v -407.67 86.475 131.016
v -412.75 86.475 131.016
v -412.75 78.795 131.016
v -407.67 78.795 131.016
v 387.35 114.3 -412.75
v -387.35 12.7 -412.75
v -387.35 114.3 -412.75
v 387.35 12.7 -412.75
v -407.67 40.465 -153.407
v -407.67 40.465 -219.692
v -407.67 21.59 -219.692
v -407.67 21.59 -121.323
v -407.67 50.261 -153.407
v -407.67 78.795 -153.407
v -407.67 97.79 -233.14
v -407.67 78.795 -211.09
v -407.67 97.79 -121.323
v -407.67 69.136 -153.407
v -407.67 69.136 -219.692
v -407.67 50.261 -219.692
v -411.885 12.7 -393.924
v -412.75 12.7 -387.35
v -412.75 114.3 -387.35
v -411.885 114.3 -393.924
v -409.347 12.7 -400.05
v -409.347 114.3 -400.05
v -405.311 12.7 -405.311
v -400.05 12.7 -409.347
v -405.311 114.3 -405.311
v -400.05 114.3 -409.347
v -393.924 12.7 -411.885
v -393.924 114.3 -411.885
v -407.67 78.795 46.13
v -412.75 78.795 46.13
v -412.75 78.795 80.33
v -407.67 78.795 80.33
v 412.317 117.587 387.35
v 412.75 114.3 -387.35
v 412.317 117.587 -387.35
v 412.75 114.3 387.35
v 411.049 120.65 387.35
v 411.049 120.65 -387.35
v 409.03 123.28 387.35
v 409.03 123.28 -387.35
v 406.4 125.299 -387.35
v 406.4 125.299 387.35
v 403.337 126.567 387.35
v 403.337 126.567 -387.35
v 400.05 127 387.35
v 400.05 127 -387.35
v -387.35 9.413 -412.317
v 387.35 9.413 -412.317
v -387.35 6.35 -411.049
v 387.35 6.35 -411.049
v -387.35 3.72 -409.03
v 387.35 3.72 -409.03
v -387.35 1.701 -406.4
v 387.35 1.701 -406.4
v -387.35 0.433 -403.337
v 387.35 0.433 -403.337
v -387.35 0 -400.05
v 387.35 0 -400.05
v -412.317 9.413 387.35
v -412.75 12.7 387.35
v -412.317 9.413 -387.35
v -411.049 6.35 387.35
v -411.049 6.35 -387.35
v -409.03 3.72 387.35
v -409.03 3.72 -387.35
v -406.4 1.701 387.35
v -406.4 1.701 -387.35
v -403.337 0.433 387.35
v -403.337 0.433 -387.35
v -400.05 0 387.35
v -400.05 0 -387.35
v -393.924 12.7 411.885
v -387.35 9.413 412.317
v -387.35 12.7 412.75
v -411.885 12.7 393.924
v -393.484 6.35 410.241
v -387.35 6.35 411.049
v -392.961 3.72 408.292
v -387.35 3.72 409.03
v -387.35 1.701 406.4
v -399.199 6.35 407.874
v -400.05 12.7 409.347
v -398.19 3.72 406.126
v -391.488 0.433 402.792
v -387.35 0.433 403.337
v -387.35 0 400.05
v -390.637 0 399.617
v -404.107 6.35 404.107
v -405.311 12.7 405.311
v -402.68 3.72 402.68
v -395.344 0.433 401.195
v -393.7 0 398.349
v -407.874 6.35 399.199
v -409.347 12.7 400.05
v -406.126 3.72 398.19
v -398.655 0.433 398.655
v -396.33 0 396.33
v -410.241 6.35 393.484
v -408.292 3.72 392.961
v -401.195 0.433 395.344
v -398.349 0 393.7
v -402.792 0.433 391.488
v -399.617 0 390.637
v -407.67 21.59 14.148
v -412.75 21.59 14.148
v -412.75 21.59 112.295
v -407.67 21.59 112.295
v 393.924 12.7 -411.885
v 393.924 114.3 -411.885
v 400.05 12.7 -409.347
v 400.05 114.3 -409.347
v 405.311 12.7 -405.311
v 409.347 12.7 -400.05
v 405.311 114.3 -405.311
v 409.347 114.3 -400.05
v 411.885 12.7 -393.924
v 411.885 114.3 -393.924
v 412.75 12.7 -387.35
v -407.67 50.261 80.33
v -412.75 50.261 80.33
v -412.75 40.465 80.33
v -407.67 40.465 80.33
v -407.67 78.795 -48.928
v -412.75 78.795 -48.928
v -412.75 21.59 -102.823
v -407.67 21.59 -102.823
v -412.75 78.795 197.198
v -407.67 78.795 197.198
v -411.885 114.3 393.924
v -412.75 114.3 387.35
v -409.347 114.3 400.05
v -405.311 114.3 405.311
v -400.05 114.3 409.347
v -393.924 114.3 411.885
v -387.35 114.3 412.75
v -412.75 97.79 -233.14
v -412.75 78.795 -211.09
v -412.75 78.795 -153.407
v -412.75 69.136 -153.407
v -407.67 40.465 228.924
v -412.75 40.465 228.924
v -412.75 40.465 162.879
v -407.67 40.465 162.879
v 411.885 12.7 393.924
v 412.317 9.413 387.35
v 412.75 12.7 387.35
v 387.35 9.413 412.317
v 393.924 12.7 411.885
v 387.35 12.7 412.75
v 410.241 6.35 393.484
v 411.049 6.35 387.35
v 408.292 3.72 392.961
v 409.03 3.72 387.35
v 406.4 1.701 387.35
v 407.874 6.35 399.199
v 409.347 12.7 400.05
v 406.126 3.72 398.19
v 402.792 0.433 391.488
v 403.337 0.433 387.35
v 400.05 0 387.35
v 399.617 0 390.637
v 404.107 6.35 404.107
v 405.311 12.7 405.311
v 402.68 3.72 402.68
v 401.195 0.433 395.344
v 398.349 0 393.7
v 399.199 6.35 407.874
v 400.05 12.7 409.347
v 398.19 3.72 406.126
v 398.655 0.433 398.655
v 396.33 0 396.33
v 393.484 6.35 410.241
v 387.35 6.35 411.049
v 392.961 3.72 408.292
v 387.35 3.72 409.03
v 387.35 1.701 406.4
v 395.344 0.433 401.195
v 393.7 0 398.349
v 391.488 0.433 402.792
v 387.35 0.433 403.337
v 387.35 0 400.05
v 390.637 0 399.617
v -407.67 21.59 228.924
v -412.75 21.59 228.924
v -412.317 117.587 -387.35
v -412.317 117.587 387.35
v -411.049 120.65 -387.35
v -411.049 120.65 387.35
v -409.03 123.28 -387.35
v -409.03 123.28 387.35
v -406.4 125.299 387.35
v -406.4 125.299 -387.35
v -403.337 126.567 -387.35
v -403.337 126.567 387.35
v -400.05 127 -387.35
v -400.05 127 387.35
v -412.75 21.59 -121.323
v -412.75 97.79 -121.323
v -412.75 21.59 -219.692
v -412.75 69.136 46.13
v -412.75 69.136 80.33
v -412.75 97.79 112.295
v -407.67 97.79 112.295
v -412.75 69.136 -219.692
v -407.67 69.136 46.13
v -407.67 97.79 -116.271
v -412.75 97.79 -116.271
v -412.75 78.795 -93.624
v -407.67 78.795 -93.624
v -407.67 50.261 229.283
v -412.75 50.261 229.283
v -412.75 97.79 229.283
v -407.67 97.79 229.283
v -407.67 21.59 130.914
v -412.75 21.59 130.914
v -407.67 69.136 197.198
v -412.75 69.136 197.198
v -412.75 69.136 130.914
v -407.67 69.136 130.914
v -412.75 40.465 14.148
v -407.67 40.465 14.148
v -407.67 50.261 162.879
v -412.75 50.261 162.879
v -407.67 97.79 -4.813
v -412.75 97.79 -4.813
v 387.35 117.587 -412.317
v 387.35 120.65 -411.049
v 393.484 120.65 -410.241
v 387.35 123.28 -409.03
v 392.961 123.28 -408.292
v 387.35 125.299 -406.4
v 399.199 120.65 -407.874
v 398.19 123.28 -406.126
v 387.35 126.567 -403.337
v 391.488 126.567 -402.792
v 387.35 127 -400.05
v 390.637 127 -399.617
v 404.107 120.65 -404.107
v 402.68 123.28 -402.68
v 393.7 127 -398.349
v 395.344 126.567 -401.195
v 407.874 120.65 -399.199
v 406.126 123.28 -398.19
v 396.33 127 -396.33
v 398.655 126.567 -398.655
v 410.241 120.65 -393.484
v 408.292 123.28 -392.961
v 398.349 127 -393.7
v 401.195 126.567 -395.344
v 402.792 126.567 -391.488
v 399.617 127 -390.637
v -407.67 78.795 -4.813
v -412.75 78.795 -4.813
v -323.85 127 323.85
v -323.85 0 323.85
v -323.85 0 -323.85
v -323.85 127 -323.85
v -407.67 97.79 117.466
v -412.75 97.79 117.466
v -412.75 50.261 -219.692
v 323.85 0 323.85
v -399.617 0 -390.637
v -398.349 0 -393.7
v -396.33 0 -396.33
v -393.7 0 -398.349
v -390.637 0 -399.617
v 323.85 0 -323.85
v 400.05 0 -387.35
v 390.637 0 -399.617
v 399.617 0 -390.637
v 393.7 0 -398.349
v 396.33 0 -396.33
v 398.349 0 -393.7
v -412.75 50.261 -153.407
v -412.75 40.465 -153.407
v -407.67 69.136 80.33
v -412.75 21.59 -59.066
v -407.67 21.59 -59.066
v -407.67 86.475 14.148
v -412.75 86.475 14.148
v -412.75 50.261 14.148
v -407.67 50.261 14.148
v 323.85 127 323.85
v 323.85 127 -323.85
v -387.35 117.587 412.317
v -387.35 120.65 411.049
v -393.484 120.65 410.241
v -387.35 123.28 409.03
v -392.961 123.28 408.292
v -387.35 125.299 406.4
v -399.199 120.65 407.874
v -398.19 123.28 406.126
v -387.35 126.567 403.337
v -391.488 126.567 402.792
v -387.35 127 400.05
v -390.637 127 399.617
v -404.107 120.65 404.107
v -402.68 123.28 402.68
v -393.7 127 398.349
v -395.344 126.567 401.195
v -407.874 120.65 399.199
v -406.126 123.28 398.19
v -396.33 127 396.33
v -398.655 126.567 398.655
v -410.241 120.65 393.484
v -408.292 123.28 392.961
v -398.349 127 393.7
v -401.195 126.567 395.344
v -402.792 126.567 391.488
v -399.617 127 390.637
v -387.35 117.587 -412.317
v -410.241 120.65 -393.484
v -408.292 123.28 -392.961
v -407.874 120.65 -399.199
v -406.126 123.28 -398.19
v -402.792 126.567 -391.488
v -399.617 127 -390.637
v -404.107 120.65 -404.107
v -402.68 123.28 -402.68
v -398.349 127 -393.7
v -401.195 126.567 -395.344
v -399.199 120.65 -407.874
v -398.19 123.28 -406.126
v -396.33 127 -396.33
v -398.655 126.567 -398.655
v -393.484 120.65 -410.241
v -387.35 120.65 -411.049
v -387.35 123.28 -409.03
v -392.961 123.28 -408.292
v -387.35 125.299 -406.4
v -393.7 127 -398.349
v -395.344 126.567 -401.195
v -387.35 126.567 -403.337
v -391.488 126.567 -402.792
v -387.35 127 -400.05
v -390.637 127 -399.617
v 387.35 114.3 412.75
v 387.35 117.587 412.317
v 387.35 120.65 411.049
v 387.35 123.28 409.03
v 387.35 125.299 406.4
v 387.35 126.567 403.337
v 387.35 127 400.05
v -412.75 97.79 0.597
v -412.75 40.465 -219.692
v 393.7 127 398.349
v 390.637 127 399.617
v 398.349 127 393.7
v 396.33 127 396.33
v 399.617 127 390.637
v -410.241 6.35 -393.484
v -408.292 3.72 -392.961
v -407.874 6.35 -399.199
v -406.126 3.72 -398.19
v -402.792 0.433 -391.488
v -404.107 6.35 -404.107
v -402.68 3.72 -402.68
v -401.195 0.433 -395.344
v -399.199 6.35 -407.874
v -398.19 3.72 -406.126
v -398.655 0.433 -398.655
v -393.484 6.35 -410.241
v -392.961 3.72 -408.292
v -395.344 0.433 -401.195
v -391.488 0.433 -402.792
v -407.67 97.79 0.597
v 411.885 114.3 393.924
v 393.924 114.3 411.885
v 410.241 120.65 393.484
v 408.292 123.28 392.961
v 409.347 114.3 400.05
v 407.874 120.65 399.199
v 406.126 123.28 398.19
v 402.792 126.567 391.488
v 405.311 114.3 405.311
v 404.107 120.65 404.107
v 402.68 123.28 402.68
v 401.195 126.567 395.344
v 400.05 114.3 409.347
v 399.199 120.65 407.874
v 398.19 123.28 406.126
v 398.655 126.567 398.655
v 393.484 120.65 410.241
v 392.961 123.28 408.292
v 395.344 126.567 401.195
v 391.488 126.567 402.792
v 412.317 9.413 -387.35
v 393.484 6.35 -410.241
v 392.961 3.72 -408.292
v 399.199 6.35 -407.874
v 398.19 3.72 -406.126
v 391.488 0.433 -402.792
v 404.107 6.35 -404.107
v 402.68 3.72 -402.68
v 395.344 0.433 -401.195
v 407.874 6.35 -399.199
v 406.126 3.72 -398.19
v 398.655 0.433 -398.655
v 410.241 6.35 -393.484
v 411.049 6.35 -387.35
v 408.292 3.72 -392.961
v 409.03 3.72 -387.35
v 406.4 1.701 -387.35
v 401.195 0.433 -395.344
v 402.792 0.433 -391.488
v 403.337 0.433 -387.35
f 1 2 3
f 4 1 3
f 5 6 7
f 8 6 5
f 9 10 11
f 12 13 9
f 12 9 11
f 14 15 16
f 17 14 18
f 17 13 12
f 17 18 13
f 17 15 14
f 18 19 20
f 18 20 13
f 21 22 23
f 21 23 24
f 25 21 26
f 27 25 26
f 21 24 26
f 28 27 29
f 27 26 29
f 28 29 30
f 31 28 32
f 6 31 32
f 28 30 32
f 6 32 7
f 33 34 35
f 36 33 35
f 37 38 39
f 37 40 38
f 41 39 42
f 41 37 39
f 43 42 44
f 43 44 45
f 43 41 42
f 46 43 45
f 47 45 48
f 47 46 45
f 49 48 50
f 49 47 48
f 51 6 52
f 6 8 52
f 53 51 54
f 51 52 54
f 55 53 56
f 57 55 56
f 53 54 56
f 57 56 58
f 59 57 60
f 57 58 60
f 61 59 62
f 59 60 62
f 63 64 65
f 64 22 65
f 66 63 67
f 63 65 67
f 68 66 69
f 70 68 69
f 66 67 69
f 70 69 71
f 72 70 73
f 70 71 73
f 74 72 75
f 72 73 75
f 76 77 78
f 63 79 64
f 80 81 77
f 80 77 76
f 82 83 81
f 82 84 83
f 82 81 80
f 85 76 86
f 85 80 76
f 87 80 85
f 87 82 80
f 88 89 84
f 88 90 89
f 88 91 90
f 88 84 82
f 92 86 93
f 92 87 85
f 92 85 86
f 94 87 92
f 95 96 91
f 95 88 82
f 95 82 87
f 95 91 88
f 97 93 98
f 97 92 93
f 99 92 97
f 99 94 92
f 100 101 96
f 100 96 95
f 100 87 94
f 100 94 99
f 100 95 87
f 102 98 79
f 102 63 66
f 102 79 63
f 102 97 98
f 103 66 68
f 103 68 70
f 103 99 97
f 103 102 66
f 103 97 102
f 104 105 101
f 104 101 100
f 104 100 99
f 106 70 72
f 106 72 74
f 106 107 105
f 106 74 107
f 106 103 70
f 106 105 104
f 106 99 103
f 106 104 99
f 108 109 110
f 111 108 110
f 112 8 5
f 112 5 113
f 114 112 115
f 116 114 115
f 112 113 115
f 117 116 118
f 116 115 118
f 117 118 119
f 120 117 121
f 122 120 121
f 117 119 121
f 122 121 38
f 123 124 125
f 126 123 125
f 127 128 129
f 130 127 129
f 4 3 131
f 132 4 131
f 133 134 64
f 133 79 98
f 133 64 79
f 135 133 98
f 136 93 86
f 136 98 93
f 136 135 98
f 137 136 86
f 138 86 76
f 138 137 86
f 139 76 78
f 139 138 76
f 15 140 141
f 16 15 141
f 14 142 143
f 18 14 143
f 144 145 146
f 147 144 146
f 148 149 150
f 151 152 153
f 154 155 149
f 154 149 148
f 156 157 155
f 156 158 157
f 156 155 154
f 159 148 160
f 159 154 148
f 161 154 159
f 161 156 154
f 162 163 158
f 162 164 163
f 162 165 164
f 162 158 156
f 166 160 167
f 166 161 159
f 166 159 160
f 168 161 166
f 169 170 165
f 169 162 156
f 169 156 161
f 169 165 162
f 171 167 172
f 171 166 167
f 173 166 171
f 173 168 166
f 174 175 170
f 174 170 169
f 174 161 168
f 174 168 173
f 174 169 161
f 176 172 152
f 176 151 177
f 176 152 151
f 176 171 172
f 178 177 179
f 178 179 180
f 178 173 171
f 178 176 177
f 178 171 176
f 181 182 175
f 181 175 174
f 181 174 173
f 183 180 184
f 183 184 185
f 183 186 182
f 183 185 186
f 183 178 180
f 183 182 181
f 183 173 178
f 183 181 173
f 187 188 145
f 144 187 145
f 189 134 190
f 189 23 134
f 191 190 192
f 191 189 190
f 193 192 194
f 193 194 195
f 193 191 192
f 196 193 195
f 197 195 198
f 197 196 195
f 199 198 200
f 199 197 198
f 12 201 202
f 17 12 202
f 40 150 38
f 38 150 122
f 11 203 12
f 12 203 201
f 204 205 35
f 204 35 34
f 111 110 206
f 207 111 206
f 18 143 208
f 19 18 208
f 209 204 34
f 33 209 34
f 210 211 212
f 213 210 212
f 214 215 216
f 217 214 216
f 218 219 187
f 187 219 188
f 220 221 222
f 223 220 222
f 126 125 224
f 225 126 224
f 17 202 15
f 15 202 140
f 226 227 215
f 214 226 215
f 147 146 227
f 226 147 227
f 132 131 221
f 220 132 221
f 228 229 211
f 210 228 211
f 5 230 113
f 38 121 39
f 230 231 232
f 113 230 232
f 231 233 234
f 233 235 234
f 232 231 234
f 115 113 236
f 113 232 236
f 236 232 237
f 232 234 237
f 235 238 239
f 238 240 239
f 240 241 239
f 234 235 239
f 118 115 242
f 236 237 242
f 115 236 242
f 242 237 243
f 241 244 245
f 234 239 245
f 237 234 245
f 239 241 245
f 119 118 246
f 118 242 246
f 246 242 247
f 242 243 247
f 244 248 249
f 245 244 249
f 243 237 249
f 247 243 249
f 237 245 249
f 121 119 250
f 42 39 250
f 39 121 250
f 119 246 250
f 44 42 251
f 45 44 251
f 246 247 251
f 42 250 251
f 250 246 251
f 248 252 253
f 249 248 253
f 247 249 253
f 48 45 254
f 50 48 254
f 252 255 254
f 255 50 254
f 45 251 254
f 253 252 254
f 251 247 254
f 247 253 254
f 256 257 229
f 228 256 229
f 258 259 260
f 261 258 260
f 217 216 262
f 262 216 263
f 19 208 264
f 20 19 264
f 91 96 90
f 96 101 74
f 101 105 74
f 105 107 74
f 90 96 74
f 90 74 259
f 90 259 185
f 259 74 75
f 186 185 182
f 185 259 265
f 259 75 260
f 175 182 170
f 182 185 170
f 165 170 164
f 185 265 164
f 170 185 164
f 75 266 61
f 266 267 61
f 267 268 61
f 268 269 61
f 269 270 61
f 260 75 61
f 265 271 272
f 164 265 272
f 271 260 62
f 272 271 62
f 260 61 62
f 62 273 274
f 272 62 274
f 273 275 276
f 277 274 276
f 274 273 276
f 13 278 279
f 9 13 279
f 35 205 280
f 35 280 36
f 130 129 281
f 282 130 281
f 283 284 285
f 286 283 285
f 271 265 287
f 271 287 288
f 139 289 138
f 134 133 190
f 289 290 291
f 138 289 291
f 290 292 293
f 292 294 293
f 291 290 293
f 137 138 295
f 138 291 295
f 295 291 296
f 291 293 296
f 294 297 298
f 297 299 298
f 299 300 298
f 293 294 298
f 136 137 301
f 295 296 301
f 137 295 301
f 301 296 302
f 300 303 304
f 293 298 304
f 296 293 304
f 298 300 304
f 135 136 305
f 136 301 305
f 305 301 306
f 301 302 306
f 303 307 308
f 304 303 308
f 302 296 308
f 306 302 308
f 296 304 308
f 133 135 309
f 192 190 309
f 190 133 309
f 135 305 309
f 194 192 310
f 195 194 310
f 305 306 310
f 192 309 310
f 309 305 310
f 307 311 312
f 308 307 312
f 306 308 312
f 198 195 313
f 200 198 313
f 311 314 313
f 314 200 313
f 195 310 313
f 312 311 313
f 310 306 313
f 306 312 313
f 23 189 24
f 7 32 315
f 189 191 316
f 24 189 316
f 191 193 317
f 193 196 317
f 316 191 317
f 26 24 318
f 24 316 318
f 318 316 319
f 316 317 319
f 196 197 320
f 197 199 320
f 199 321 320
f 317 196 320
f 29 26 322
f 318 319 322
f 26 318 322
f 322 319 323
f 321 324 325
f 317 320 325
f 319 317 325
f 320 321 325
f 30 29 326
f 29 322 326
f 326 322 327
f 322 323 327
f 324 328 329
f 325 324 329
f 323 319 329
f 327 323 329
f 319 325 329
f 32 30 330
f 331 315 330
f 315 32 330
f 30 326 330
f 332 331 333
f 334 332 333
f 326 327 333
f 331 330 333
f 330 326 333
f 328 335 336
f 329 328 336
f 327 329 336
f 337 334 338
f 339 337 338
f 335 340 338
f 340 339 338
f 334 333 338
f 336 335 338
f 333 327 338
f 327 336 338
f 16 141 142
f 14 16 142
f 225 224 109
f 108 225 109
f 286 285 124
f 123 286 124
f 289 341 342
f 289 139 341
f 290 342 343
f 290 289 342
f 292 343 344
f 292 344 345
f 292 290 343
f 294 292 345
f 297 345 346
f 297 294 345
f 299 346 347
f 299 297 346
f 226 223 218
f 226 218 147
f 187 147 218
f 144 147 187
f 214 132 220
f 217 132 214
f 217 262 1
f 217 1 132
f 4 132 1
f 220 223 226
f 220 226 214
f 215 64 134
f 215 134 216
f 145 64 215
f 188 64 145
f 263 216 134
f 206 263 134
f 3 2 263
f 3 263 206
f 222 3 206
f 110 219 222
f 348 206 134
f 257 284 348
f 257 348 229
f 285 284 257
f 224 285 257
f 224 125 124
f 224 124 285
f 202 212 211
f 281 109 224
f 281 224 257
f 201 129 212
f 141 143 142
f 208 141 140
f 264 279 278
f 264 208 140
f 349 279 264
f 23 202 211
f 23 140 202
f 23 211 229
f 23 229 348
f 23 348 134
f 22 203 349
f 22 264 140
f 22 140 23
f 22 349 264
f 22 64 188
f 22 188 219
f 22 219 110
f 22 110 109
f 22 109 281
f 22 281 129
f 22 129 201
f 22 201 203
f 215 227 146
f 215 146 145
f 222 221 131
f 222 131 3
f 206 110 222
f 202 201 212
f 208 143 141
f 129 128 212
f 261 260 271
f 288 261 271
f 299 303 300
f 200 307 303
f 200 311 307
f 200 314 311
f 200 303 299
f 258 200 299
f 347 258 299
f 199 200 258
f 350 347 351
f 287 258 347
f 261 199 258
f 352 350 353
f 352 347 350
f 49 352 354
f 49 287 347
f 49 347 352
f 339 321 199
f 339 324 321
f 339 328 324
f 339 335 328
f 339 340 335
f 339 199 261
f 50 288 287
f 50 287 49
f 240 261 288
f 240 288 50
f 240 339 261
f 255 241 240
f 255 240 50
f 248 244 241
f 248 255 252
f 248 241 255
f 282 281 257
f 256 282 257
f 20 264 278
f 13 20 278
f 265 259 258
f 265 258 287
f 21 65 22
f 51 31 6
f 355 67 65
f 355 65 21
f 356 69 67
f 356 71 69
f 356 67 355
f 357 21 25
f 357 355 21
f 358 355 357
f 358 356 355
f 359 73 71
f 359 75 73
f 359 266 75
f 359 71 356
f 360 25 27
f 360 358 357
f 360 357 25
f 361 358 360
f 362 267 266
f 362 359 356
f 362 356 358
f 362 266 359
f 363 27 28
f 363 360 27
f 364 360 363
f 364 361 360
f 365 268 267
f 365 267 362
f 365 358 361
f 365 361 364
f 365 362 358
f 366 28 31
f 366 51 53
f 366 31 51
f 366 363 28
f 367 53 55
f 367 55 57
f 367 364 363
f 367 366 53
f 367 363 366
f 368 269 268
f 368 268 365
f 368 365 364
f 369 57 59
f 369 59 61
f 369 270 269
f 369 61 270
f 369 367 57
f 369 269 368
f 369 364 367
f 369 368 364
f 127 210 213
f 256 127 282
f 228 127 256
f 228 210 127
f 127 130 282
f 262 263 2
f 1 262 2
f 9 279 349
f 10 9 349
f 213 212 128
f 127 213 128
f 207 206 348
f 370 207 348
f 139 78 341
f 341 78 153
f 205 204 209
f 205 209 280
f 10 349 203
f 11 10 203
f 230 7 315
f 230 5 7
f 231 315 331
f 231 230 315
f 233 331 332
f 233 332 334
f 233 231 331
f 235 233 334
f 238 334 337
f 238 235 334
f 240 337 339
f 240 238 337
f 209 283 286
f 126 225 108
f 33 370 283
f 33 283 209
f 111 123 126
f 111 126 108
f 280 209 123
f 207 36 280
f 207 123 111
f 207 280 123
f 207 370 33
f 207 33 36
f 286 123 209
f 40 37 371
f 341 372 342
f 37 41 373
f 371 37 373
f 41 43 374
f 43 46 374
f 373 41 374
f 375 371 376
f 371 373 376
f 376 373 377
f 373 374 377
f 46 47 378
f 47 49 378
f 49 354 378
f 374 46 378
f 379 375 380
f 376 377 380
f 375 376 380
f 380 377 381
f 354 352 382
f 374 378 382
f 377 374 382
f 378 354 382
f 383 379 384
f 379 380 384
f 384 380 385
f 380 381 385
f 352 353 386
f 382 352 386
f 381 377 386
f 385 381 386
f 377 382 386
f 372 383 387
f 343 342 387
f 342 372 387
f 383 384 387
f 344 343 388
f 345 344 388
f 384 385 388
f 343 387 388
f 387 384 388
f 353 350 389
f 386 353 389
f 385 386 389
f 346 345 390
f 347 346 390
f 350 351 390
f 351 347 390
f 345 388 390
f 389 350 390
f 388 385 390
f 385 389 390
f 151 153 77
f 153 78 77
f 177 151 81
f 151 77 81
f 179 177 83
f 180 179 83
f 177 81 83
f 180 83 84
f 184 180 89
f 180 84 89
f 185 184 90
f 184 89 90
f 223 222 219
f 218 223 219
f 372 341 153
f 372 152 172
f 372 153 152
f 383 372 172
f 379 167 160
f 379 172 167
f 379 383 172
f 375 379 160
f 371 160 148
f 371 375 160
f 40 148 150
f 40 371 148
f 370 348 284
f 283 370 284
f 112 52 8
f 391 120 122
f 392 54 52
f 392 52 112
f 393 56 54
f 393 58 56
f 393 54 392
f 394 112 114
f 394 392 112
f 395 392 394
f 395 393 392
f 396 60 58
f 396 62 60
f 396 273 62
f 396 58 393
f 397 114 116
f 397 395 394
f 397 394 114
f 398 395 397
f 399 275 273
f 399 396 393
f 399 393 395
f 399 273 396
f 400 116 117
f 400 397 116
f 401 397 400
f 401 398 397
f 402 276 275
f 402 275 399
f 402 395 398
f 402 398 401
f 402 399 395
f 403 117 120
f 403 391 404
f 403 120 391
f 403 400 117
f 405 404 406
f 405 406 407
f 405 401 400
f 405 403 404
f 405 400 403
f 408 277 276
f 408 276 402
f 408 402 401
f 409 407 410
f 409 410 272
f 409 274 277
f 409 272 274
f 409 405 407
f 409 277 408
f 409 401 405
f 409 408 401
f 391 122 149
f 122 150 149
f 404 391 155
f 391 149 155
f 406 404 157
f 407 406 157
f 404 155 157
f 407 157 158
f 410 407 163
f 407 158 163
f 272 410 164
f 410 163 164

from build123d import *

# Parameters (mm, degrees)
SKETCH1_W           = 825.5
SKETCH1_H           = 825.5
SKETCH1_W_2         = 647.7
SKETCH1_H_2         = 647.7
BOSS_EXTRUDE1_DEPTH = 127
FILLET1_R           = 25.4
FILLET2_R           = 12.7
SKETCH2_W           = 34.200403136
SKETCH2_H           = 9.659395297
CUT_EXTRUDE1_DEPTH  = 5.08


with BuildPart() as part:
    # Sketch1 → Boss-Extrude1 (new body)
    with BuildSketch(Plane(origin=(0, 0, 0), x_dir=(1, 0, 0), z_dir=(0, 1, 0))):
        Rectangle(SKETCH1_W, SKETCH1_H)
        Rectangle(SKETCH1_W_2, SKETCH1_H_2, mode=Mode.SUBTRACT)
    extrude(amount=BOSS_EXTRUDE1_DEPTH)

    # Fillet1
    fillet1_edges = [part.edges().sort_by_distance(p)[0] for p in [
        (412.75, 63.5, 412.75),
        (-412.75, 63.5, 412.75),
        (-412.75, 63.5, -412.75),
        (412.75, 63.5, -412.75),
    ]]
    fillet(fillet1_edges, radius=FILLET1_R)

    # Fillet2
    fillet2_edges = [part.edges().sort_by_distance(p)[0] for p in [
        (-412.75, 0, 0),
        (-412.75, 127, 0),
        (412.75, 0, 0),
        (0, 0, 412.75),
        (0, 0, -412.75),
        (405.310512242, 0, 405.310512242),
        (405.310512242, 0, -405.310512242),
        (-405.310512242, 0, 405.310512242),
        (-405.310512242, 0, -405.310512242),
        (0, 127, -412.75),
        (412.75, 127, 0),
        (0, 127, 412.75),
        (405.310512242, 127, 405.310512242),
        (405.310512242, 127, -405.310512242),
        (-405.310512242, 127, 405.310512242),
        (-405.310512242, 127, -405.310512242),
    ]]
    fillet(fillet2_edges, radius=FILLET2_R)

    # Sketch2 → Cut-Extrude1 (cut)
    # profile 1 of 4: a face of its own
    with BuildSketch(Plane.ZY.offset(412.75)):
        Polygon((-121.32268757, 97.79), (-233.139574468, 97.79), (-211.090212766, 78.795464726), (-153.406898096, 78.795464726), (-153.406898096, 69.136069429), (-219.691511758, 69.136069429), (-219.691511758, 50.260996641), (-153.406898096, 50.260996641), (-153.406898096, 40.465072788), (-219.691511758, 40.465072788), (-219.691511758, 21.59), (-121.32268757, 21.59), align=None)
    # profile 2 of 4: a face of its own
    with BuildSketch(Plane.ZY.offset(412.75)):
        Polygon((-4.812631579, 97.79), (-116.271131019, 97.79), (-93.624456887, 78.795464726), (-48.928421053, 78.795464726), (-102.823068309, 21.59), (-59.065666293, 21.59), (-4.812631579, 78.795464726), align=None)
    # profile 3 of 4: a face of its own
    with BuildSketch(Plane.ZY.offset(412.75)):
        Polygon((80.329988802, 50.260996641), (80.329988802, 40.465072788), (14.147771557, 40.465072788), (14.147771557, 21.59), (112.294736842, 21.59), (112.294736842, 97.79), (0.59731243, 97.79), (14.147771557, 86.475195969), (14.147771557, 50.260996641), align=None)
        with Locations((63.229787234, 73.965767078)):
            Rectangle(SKETCH2_W, SKETCH2_H, mode=Mode.SUBTRACT)
    # profile 4 of 4: a face of its own
    with BuildSketch(Plane.ZY.offset(412.75)):
        Polygon((229.282642777, 97.79), (117.465755879, 97.79), (131.016215006, 86.475195969), (131.016215006, 78.795464726), (197.198432251, 78.795464726), (197.198432251, 69.136069429), (130.913818589, 69.136069429), (130.913818589, 21.59), (228.924255319, 21.59), (228.924255319, 40.465072788), (162.878566629, 40.465072788), (162.878566629, 50.260996641), (229.282642777, 50.260996641), align=None)
    extrude(amount=-CUT_EXTRUDE1_DEPTH, mode=Mode.SUBTRACT)


solid = part.part
